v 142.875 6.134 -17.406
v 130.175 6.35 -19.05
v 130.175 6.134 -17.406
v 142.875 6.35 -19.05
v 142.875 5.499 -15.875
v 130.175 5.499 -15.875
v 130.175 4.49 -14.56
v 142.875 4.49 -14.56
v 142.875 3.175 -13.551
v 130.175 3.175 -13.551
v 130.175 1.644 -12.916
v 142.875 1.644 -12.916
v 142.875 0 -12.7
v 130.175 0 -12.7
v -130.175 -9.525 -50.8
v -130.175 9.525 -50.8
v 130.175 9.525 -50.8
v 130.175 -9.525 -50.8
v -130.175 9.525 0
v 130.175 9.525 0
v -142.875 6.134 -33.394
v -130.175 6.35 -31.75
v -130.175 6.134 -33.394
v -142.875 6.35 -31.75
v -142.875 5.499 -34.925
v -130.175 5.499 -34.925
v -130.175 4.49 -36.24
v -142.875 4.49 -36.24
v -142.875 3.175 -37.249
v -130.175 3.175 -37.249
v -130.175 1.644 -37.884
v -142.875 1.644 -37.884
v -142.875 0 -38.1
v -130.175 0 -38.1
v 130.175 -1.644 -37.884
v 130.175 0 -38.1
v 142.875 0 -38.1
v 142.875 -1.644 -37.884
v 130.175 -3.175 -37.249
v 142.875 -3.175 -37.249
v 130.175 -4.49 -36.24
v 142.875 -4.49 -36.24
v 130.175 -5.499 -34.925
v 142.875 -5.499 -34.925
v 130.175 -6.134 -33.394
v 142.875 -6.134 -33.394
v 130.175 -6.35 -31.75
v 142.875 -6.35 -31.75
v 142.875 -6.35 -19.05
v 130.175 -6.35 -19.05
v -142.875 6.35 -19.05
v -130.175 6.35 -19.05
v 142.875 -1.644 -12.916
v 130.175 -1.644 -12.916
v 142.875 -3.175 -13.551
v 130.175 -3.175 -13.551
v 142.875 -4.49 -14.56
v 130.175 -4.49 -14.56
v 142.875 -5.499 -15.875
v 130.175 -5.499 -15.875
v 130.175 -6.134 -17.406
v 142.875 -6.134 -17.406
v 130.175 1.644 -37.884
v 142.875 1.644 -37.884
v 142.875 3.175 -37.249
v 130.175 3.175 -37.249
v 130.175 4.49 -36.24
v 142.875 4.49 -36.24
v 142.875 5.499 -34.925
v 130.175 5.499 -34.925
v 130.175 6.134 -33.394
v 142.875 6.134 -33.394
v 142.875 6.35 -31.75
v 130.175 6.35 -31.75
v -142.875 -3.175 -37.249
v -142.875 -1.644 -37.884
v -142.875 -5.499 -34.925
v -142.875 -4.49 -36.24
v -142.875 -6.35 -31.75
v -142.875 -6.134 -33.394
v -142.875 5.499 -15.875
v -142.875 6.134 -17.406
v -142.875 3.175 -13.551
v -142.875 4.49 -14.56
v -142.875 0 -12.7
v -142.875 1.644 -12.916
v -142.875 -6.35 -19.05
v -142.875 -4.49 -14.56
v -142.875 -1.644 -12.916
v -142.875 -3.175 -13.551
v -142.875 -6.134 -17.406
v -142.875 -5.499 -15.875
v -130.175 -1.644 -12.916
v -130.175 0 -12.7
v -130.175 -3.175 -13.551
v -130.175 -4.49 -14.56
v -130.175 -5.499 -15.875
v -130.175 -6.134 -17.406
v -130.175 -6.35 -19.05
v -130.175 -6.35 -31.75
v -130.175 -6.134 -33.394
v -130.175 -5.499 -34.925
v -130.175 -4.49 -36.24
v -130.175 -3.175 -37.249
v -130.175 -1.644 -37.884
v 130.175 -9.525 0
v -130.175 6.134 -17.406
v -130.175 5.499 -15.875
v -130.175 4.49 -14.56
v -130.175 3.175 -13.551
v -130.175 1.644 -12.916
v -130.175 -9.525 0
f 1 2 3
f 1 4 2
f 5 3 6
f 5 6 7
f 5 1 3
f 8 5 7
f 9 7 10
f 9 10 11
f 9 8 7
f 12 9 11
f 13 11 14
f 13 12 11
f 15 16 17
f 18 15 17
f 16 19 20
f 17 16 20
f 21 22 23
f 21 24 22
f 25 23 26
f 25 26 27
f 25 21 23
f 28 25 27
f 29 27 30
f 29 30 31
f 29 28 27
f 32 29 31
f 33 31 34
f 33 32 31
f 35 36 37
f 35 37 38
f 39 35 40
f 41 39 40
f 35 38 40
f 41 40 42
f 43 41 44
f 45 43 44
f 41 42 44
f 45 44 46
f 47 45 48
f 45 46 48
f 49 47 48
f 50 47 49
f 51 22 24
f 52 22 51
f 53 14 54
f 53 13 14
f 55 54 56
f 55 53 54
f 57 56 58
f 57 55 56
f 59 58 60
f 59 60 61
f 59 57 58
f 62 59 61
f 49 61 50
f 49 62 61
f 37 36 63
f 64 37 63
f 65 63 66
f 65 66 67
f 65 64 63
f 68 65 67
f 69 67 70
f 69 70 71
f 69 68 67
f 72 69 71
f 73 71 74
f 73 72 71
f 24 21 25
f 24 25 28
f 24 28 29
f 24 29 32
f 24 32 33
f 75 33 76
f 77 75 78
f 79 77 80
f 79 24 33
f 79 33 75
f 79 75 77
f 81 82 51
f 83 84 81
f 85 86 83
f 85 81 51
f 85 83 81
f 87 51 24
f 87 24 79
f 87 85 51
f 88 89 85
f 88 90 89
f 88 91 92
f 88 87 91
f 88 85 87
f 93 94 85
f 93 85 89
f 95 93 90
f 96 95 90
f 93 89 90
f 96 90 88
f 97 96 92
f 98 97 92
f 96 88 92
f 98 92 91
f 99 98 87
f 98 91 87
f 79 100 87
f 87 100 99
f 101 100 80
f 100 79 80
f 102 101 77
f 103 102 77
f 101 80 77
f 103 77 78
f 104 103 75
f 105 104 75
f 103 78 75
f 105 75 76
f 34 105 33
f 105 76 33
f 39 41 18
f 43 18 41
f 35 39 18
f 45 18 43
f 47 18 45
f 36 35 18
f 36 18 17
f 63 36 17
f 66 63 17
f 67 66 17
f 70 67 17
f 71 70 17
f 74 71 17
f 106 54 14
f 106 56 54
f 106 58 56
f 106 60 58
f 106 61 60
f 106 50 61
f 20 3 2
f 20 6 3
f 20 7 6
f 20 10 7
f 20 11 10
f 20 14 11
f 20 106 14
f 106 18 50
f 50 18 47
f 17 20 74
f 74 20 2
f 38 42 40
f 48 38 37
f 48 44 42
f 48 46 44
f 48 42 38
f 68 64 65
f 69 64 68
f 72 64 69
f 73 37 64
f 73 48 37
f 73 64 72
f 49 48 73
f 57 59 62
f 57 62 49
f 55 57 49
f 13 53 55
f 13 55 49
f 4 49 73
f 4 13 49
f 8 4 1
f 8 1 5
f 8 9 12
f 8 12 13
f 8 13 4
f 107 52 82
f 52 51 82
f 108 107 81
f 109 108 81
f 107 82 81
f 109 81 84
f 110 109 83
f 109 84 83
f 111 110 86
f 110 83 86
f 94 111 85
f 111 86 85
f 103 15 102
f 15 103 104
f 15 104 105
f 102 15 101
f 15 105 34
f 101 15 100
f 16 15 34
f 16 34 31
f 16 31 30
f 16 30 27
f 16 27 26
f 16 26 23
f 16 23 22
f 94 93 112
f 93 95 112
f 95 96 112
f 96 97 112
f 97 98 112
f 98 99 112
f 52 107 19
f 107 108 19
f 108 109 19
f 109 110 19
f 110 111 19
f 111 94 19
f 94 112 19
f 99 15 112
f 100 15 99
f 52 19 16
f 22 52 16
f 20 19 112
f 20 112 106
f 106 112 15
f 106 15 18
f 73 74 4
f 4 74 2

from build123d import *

# Parameters (mm, degrees)
F0_W     = 260.35
F0_H     = 19.05
F1_DEPTH = 50.8
F2_W     = 12.7
F2_H     = 25.4
F3_DEPTH = 12.7
F4_R     = 6.34999
F5_W     = 12.7
F5_H     = 25.4
F6_DEPTH = 12.7
F7_R     = 6.34999


# Not quite as in the source:
# - a fillet or chamfer is up to 0.001 mm smaller than in the source, because OpenCascade refuses the exact size


with BuildPart() as f1:
    # F0 (on Top) → F1 (new body)
    with BuildSketch(Plane.XY):
        Rectangle(F0_W, F0_H)
    extrude(amount=-F1_DEPTH)

    # F2 (on face) → F3 (join)
    with BuildSketch(Plane(origin=(-130.175, 0, 0), x_dir=(0, -1, 0), z_dir=(-1, 0, 0))):
        with Locations((0, -25.4)):
            Rectangle(F2_W, F2_H)
    extrude(amount=F3_DEPTH)

    # F4 (radius 6.35 in the source; OpenCascade refuses exactly that, so slightly less here)
    f4_edges = [f1.edges().sort_by_distance(p)[0] for p in [
        (-136.525, 6.35, -12.7),
        (-136.525, -6.35, -12.7),
        (-136.525, -6.35, -38.1),
        (-136.525, 6.35, -38.1),
    ]]
    fillet(f4_edges, radius=F4_R)

    # F5 (on face) → F6 (join)
    with BuildSketch(Plane.YZ.offset(130.175)):
        with Locations((0, -25.4)):
            Rectangle(F5_W, F5_H)
    extrude(amount=F6_DEPTH)

    # F7 (radius 6.35 in the source; OpenCascade refuses exactly that, so slightly less here)
    f7_edges = [f1.edges().sort_by_distance(p)[0] for p in [
        (136.525, -6.35, -12.7),
        (136.525, 6.35, -12.7),
        (136.525, 6.35, -38.1),
        (136.525, -6.35, -38.1),
    ]]
    fillet(f7_edges, radius=F7_R)


solid = f1.part
